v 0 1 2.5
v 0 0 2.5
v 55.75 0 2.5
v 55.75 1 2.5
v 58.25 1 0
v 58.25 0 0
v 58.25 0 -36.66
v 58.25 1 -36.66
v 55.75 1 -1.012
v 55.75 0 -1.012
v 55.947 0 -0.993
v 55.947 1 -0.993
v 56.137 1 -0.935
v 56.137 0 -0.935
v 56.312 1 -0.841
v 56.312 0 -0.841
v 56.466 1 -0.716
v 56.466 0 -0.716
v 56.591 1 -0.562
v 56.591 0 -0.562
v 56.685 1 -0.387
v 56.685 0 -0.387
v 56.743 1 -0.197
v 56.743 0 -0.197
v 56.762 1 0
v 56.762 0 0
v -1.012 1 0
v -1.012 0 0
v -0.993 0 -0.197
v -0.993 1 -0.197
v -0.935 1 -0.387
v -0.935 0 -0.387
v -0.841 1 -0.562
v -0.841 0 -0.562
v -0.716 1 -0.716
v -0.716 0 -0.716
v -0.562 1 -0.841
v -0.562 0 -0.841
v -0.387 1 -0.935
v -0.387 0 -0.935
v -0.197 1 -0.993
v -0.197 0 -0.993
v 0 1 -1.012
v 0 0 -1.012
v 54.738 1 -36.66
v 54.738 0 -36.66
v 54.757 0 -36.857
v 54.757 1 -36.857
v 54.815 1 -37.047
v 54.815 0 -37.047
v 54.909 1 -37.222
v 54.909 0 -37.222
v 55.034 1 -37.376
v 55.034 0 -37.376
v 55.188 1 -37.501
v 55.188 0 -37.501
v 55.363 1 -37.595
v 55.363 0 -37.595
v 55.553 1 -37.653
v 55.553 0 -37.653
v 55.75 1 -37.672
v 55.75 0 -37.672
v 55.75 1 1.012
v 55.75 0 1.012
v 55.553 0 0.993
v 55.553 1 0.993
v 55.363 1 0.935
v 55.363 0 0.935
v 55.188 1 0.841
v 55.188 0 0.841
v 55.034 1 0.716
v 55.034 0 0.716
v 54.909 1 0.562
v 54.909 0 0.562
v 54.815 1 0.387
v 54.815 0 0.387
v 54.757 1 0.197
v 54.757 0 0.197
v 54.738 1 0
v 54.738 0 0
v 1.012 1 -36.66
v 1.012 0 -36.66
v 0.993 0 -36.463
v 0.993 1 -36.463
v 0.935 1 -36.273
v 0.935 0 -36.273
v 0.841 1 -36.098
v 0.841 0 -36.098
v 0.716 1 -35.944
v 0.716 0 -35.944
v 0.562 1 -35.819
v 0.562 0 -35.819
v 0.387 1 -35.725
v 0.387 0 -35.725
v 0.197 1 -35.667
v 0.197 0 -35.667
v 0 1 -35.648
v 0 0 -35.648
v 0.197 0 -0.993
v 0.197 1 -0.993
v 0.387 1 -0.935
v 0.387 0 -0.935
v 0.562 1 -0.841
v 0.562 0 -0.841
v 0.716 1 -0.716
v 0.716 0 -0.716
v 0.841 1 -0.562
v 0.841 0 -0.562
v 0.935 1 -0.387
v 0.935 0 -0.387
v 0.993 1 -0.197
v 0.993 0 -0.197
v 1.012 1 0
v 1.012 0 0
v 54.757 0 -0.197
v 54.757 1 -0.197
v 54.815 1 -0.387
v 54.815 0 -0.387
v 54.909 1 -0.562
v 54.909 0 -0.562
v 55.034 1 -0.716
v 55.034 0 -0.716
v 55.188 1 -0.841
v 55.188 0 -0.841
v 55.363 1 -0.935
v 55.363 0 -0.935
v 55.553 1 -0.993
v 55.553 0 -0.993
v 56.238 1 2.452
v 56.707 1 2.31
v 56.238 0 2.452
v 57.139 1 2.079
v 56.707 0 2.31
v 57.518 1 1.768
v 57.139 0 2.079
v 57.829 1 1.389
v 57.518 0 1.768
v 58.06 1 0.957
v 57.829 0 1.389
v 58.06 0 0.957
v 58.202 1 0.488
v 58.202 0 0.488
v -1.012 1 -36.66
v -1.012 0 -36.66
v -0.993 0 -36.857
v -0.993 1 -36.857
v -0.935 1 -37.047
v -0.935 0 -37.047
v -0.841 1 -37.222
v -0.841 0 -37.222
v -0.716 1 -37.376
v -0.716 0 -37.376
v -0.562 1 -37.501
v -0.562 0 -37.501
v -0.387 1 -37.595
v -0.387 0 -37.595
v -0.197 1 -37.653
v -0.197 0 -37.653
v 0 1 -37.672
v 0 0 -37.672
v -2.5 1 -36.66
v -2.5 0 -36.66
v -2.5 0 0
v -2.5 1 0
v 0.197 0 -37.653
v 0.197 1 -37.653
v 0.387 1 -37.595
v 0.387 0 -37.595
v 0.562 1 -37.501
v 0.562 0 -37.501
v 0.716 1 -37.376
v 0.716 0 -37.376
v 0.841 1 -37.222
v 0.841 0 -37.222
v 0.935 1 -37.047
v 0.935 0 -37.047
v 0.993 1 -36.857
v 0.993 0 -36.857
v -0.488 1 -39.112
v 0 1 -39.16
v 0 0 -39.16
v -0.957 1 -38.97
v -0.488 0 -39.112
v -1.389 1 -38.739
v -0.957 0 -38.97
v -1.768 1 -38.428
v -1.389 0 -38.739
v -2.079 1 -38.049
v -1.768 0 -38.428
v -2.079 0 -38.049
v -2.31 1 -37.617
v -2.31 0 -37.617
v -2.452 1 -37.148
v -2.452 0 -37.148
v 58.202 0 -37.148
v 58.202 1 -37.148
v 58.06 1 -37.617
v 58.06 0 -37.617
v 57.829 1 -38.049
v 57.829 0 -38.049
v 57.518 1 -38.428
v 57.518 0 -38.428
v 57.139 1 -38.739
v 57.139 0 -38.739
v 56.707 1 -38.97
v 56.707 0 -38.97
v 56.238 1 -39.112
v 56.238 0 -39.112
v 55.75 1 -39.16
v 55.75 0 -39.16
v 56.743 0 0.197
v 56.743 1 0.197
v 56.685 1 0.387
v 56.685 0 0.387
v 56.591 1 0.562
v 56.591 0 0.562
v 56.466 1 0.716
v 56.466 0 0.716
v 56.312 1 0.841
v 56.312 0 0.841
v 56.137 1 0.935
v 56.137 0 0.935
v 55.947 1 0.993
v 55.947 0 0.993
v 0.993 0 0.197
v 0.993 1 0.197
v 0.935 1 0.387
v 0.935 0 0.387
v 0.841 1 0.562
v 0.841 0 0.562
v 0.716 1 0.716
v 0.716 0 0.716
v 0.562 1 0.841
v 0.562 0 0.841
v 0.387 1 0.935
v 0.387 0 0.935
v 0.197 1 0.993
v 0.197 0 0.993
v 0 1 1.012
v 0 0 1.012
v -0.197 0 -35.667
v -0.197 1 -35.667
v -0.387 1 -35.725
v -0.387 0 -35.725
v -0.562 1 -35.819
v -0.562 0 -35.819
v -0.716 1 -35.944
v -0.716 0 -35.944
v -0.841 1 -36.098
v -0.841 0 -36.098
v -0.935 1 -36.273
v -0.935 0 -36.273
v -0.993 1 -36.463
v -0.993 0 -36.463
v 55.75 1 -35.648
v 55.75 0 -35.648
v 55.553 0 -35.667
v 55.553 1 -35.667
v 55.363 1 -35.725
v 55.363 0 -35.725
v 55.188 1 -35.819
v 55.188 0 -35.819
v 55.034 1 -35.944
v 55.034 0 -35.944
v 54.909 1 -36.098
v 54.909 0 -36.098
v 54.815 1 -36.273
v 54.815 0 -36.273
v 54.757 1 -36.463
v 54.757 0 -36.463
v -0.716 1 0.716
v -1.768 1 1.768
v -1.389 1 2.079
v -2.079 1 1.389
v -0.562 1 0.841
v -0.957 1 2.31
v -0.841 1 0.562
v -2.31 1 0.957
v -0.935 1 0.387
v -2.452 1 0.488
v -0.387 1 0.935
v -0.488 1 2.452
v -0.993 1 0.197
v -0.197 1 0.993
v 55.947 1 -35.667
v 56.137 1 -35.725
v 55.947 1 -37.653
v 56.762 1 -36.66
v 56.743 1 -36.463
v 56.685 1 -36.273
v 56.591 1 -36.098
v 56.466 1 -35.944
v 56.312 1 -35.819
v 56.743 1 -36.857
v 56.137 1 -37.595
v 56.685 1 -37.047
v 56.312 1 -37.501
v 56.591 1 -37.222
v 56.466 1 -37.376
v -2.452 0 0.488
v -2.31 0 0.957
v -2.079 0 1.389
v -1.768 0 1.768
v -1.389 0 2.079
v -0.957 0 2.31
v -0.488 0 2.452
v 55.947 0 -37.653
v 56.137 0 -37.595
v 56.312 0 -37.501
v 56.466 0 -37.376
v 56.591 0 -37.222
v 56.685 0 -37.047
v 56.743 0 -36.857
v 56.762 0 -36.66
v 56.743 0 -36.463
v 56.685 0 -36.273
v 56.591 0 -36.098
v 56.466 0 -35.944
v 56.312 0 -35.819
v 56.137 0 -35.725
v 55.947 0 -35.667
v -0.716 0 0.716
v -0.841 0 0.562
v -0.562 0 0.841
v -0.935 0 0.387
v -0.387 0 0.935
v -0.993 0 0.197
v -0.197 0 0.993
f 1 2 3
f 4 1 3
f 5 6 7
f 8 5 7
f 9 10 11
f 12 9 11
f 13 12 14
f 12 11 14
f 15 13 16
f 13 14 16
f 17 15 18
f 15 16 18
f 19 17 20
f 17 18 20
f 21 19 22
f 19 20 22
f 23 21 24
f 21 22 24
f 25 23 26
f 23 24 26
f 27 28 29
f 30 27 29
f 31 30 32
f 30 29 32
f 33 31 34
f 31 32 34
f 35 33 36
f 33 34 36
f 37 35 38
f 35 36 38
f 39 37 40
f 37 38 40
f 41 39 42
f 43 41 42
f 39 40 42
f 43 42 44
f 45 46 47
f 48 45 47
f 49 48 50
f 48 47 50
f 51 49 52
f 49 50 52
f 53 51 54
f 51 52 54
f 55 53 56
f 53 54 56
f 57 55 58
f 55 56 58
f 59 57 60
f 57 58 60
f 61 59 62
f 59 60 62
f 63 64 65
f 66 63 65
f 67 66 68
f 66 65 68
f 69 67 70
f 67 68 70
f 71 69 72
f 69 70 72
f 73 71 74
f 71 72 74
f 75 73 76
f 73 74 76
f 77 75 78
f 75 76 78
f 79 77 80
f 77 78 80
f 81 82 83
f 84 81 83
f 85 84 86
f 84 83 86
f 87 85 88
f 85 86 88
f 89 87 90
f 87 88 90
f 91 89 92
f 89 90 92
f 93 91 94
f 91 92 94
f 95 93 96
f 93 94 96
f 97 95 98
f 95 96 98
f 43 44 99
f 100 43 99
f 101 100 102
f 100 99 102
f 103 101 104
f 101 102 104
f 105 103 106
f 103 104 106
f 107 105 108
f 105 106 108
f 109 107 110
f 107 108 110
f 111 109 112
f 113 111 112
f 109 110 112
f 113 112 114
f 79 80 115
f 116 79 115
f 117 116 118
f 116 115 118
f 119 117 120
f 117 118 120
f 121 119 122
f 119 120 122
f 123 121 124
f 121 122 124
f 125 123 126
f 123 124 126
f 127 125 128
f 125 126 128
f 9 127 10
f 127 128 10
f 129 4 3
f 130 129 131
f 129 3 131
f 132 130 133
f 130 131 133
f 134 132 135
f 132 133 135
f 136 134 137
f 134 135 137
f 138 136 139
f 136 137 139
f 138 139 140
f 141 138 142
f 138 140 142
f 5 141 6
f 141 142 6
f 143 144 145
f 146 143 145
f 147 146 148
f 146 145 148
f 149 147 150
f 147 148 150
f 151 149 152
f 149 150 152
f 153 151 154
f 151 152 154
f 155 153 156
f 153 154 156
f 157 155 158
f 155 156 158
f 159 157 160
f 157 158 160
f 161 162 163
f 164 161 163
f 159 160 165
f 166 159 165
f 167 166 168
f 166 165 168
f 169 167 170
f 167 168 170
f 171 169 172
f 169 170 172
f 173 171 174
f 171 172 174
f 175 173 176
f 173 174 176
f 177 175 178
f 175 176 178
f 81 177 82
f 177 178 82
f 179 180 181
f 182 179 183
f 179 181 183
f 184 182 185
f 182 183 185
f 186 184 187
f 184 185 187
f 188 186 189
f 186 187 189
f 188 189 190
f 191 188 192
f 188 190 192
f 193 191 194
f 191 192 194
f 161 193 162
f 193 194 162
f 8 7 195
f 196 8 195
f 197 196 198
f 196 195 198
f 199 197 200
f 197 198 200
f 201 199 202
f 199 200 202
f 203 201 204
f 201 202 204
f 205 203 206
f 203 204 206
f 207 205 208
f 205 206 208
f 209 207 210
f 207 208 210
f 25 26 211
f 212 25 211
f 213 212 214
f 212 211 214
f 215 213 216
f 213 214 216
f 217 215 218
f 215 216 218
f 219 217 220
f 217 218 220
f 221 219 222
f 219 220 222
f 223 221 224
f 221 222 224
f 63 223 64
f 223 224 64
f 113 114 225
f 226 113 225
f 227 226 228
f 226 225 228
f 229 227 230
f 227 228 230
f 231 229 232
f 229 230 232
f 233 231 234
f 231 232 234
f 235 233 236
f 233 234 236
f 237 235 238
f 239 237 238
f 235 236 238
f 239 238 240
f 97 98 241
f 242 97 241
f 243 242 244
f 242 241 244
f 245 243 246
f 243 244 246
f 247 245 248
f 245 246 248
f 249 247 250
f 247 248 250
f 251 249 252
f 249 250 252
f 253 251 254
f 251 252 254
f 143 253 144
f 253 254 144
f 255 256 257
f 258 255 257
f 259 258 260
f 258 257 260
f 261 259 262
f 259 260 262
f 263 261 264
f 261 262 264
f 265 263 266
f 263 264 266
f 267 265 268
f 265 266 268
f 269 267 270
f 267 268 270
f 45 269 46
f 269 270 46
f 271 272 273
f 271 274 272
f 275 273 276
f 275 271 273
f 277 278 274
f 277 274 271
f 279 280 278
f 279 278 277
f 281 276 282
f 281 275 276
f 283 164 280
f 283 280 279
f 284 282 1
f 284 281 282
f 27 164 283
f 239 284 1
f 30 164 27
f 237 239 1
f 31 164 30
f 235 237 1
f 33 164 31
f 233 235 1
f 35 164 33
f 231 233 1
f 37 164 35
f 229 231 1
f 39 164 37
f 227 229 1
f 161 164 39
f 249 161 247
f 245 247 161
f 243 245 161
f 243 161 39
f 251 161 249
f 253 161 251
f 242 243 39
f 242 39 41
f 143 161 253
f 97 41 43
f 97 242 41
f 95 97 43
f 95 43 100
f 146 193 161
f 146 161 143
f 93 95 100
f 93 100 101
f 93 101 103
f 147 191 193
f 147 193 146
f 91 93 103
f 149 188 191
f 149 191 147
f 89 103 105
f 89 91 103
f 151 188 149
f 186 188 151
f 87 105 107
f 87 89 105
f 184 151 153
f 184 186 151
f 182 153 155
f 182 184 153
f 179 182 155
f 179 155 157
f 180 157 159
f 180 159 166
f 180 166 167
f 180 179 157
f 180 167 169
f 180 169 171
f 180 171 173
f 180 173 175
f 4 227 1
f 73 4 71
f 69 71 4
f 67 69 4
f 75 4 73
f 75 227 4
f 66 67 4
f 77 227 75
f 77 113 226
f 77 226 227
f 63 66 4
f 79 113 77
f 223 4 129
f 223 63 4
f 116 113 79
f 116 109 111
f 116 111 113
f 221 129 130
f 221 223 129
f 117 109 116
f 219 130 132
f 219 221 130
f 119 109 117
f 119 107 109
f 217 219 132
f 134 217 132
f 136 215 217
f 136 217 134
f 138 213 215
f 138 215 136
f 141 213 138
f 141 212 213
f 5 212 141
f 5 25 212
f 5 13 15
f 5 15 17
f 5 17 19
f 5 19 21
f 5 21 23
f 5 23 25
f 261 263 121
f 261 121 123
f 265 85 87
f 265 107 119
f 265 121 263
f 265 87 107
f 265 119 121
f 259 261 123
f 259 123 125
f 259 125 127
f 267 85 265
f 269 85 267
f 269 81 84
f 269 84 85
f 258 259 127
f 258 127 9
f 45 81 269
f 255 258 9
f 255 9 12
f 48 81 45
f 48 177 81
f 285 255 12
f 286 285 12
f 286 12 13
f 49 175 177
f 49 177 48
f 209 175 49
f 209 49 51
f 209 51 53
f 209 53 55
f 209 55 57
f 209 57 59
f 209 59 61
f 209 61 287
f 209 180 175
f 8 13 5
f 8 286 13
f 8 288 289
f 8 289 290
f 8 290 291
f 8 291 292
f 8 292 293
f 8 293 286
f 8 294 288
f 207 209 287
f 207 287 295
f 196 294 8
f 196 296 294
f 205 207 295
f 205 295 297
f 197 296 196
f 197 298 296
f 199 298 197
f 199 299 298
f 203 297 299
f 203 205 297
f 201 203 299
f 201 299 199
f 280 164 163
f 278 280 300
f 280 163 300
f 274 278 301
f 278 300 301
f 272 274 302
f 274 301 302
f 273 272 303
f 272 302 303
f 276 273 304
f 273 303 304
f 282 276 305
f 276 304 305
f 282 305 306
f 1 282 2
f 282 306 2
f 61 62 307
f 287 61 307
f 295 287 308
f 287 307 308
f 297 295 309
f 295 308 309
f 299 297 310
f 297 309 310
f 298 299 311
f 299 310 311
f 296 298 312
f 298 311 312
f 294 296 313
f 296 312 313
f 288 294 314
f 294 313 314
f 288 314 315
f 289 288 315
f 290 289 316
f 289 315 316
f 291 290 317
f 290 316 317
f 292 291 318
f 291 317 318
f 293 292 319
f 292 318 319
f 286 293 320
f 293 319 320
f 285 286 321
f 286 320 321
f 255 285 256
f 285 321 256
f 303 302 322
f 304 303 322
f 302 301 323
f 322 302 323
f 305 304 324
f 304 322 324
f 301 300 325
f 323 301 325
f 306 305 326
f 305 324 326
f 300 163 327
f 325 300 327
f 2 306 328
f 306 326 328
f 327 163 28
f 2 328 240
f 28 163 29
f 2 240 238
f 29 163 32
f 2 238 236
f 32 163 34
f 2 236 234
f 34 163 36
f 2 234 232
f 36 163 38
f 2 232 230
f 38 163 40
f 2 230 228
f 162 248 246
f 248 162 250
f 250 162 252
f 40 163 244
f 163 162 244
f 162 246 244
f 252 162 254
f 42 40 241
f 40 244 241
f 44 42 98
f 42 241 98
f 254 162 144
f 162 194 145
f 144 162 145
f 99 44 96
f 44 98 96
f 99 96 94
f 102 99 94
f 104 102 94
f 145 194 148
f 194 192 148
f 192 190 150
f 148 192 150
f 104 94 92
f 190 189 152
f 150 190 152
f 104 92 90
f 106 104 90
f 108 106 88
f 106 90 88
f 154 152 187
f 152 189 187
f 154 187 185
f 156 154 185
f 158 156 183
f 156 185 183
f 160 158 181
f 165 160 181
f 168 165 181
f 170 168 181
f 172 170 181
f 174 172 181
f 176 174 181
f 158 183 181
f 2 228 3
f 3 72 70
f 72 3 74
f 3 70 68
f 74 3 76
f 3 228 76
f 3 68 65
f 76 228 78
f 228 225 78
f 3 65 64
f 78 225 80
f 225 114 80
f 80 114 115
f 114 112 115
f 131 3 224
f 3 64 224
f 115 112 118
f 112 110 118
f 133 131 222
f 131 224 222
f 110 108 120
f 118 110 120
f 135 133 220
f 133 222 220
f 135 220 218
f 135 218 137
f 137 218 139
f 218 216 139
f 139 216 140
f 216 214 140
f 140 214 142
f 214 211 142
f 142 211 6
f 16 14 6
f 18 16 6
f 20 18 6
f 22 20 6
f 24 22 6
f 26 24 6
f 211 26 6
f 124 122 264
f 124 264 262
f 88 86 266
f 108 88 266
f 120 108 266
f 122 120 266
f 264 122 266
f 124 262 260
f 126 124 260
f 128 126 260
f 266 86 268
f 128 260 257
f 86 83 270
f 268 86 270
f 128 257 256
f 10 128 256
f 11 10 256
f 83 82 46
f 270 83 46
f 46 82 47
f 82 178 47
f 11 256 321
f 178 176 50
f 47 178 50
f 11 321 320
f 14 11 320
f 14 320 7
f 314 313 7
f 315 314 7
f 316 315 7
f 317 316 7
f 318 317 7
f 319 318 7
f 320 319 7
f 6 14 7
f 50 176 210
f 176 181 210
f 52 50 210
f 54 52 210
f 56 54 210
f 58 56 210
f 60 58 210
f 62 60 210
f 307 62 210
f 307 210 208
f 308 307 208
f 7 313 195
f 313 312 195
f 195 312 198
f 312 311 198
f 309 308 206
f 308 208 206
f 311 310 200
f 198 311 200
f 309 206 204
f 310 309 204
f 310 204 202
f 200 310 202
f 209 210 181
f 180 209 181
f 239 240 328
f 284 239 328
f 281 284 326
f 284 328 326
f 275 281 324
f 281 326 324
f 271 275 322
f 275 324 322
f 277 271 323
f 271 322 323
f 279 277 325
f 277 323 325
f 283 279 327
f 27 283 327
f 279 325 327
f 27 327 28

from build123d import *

# Parameters (mm, degrees)
BOSS_EXTRUDE3_DEPTH = 2
BOSS_EXTRUDE4_DEPTH = 2
BOSS_EXTRUDE5_DEPTH = 2
CUT_EXTRUDE21_DEPTH = 10
SKETCH7_W           = 2.5
SKETCH7_H           = 2.5
CUT_EXTRUDE23_DEPTH = 1
SKETCH8_W           = 22.1023805
SKETCH8_H           = 14.934040877
BOSS_EXTRUDE6_DEPTH = 1


with BuildPart() as part:
    # Sketch1 → Boss-Extrude3 (new body)
    with BuildSketch(Plane(origin=(0, 0, 0), x_dir=(1, 0, 0), z_dir=(0, 1, 0))):
        with BuildLine():
            Line((58.25, 0), (58.25, 36.66))
            ThreePointArc((58.25, 36.66), (53.982233047, 34.892233047), (55.75, 39.16))
            Line((55.75, 39.16), (0, 39.16))
            ThreePointArc((0, 39.16), (1.767766953, 34.892233047), (-2.5, 36.66))
            Line((-2.5, 36.66), (-2.5, 0))
            ThreePointArc((-2.5, 0), (1.767766953, 1.767766953), (0, -2.5))
            Line((0, -2.5), (55.75, -2.5))
            ThreePointArc((55.75, -2.5), (53.982233047, 1.767766953), (58.25, 0))
        make_face()
    extrude(amount=BOSS_EXTRUDE3_DEPTH)

    # Sketch1<5> → Boss-Extrude4 (add)
    with BuildSketch(Plane(origin=(0, 0, 0), x_dir=(1, 0, 0), z_dir=(0, 1, 0))):
        with BuildLine():
            ThreePointArc((55.75, -2.5), (57.517766953, -1.767766953), (58.25, 0))
            Line((58.25, 0), (56.762, 0))
            ThreePointArc((56.762, 0), (56.465592063, -0.715592063), (55.75, -1.012))
            Line((55.75, -1.012), (55.75, -2.5))
        make_face()
        with BuildLine():
            Line((55.75, 1.012), (55.75, 2.5))
            ThreePointArc((55.75, 2.5), (53.982233047, 1.767766953), (53.25, 0))
            Line((53.25, 0), (54.738, 0))
            ThreePointArc((54.738, 0), (55.034407937, 0.715592063), (55.75, 1.012))
        make_face()
        with BuildLine():
            ThreePointArc((53.25, 0), (53.982233047, -1.767766953), (55.75, -2.5))
            Line((55.75, -2.5), (55.75, -1.012))
            ThreePointArc((55.75, -1.012), (55.034407937, -0.715592063), (54.738, 0))
            Line((54.738, 0), (53.25, 0))
        make_face()
        with BuildLine():
            Line((56.762, 0), (58.25, 0))
            ThreePointArc((58.25, 0), (57.517766953, 1.767766953), (55.75, 2.5))
            Line((55.75, 2.5), (55.75, 1.012))
            ThreePointArc((55.75, 1.012), (56.465592063, 0.715592063), (56.762, 0))
        make_face()
    extrude(amount=BOSS_EXTRUDE4_DEPTH)

    # Sketch1<6> → Boss-Extrude5 (add)
    with BuildSketch(Plane(origin=(0, 0, 0), x_dir=(1, 0, 0), z_dir=(0, 1, 0))):
        with BuildLine():
            ThreePointArc((-2.5, 0), (-1.767766953, -1.767766953), (0, -2.5))
            Line((0, -2.5), (0, -1.012))
            ThreePointArc((0, -1.012), (-0.715592063, -0.715592063), (-1.012, 0))
            Line((-1.012, 0), (-2.5, 0))
        make_face()
        with BuildLine():
            Line((0, 1.012), (0, 2.5))
            ThreePointArc((0, 2.5), (-1.767766953, 1.767766953), (-2.5, 0))
            Line((-2.5, 0), (-1.012, 0))
            ThreePointArc((-1.012, 0), (-0.715592063, 0.715592063), (0, 1.012))
        make_face()
        with BuildLine():
            ThreePointArc((2.5, 0), (1.767766953, 1.767766953), (0, 2.5))
            Line((0, 2.5), (0, 1.012))
            ThreePointArc((0, 1.012), (0.715592063, 0.715592063), (1.012, 0))
            Line((1.012, 0), (2.5, 0))
        make_face()
        with BuildLine():
            Line((0, -1.012), (0, -2.5))
            ThreePointArc((0, -2.5), (1.767766953, -1.767766953), (2.5, 0))
            Line((2.5, 0), (1.012, 0))
            ThreePointArc((1.012, 0), (0.715592063, -0.715592063), (0, -1.012))
        make_face()
        with BuildLine():
            ThreePointArc((-2.5, 36.66), (-1.767766953, 34.892233047), (0, 34.16))
            Line((0, 34.16), (0, 35.648))
            ThreePointArc((0, 35.648), (-0.715592063, 35.944407937), (-1.012, 36.66))
            Line((-1.012, 36.66), (-2.5, 36.66))
        make_face()
        with BuildLine():
            Line((0, 37.672), (0, 39.16))
            ThreePointArc((0, 39.16), (-1.767766953, 38.427766953), (-2.5, 36.66))
            Line((-2.5, 36.66), (-1.012, 36.66))
            ThreePointArc((-1.012, 36.66), (-0.715592063, 37.375592063), (0, 37.672))
        make_face()
        with BuildLine():
            Line((1.012, 36.66), (2.5, 36.66))
            ThreePointArc((2.5, 36.66), (1.767766953, 38.427766953), (0, 39.16))
            Line((0, 39.16), (0, 37.672))
            ThreePointArc((0, 37.672), (0.715592063, 37.375592063), (1.012, 36.66))
        make_face()
        with BuildLine():
            ThreePointArc((0, 34.16), (1.767766953, 34.892233047), (2.5, 36.66))
            Line((2.5, 36.66), (1.012, 36.66))
            ThreePointArc((1.012, 36.66), (0.715592063, 35.944407937), (0, 35.648))
            Line((0, 35.648), (0, 34.16))
        make_face()
        with BuildLine():
            ThreePointArc((55.75, 35.648), (55.034407937, 35.944407937), (54.738, 36.66))
            Line((54.738, 36.66), (53.25, 36.66))
            ThreePointArc((53.25, 36.66), (53.982233047, 34.892233047), (55.75, 34.16))
            Line((55.75, 34.16), (55.75, 35.648))
        make_face()
        with BuildLine():
            Line((53.25, 36.66), (54.738, 36.66))
            ThreePointArc((54.738, 36.66), (55.034407937, 37.375592063), (55.75, 37.672))
            Line((55.75, 37.672), (55.75, 39.16))
            ThreePointArc((55.75, 39.16), (53.982233047, 38.427766953), (53.25, 36.66))
        make_face()
        with BuildLine():
            ThreePointArc((55.75, 37.672), (56.465592063, 37.375592063), (56.762, 36.66))
            Line((56.762, 36.66), (58.25, 36.66))
            ThreePointArc((58.25, 36.66), (57.517766953, 38.427766953), (55.75, 39.16))
            Line((55.75, 39.16), (55.75, 37.672))
        make_face()
        with BuildLine():
            Line((58.25, 36.66), (56.762, 36.66))
            ThreePointArc((56.762, 36.66), (56.465592063, 35.944407937), (55.75, 35.648))
            Line((55.75, 35.648), (55.75, 34.16))
            ThreePointArc((55.75, 34.16), (57.517766953, 34.892233047), (58.25, 36.66))
        make_face()
    extrude(amount=BOSS_EXTRUDE5_DEPTH)

    # Sketch2 → Cut-Extrude21 (cut)
    with BuildSketch(Plane(origin=(0, 2, 0), x_dir=(1, 0, 0), z_dir=(0, 1, 0))):
        with BuildLine():
            Line((33.435800302, 28.16), (33.925, 28.16))
            Line((33.925, 28.16), (33.925, 30.16))
            Line((33.925, 30.16), (33.435800302, 30.16))
            ThreePointArc((33.435800302, 30.16), (27.875, 34.81), (22.314199698, 30.16))
            Line((22.314199698, 30.16), (21.825, 30.16))
            Line((21.825, 30.16), (21.825, 28.16))
            Line((21.825, 28.16), (22.314199698, 28.16))
            ThreePointArc((22.314199698, 28.16), (27.875, 23.51), (33.435800302, 28.16))
        make_face()
    extrude(amount=-CUT_EXTRUDE21_DEPTH, mode=Mode.SUBTRACT)

    # Sketch7 → Cut-Extrude23 (cut)
    with BuildSketch(Plane(origin=(0, 2, 0), x_dir=(1, 0, 0), z_dir=(0, 1, 0))):
        with Locations((57, -1.25)):
            Rectangle(SKETCH7_W, SKETCH7_H)
        Polygon((-2.5, -2.5), (55.75, -2.5), (55.75, 0), (58.25, 0), (58.25, 39.16), (0, 39.16), (0, 36.66), (-2.5, 36.66), align=None)
        with Locations((-1.25, 37.91)):
            Rectangle(SKETCH7_W, SKETCH7_H)
    extrude(amount=-CUT_EXTRUDE23_DEPTH, mode=Mode.SUBTRACT)

    # Sketch8 → Boss-Extrude6 (add)
    with BuildSketch(Plane(origin=(0, 1, 0), x_dir=(1, 0, 0), z_dir=(0, 1, 0))):
        with Locations((28.465364517, 28.71396685)):
            Rectangle(SKETCH8_W, SKETCH8_H)
    extrude(amount=-BOSS_EXTRUDE6_DEPTH)


solid = part.part
